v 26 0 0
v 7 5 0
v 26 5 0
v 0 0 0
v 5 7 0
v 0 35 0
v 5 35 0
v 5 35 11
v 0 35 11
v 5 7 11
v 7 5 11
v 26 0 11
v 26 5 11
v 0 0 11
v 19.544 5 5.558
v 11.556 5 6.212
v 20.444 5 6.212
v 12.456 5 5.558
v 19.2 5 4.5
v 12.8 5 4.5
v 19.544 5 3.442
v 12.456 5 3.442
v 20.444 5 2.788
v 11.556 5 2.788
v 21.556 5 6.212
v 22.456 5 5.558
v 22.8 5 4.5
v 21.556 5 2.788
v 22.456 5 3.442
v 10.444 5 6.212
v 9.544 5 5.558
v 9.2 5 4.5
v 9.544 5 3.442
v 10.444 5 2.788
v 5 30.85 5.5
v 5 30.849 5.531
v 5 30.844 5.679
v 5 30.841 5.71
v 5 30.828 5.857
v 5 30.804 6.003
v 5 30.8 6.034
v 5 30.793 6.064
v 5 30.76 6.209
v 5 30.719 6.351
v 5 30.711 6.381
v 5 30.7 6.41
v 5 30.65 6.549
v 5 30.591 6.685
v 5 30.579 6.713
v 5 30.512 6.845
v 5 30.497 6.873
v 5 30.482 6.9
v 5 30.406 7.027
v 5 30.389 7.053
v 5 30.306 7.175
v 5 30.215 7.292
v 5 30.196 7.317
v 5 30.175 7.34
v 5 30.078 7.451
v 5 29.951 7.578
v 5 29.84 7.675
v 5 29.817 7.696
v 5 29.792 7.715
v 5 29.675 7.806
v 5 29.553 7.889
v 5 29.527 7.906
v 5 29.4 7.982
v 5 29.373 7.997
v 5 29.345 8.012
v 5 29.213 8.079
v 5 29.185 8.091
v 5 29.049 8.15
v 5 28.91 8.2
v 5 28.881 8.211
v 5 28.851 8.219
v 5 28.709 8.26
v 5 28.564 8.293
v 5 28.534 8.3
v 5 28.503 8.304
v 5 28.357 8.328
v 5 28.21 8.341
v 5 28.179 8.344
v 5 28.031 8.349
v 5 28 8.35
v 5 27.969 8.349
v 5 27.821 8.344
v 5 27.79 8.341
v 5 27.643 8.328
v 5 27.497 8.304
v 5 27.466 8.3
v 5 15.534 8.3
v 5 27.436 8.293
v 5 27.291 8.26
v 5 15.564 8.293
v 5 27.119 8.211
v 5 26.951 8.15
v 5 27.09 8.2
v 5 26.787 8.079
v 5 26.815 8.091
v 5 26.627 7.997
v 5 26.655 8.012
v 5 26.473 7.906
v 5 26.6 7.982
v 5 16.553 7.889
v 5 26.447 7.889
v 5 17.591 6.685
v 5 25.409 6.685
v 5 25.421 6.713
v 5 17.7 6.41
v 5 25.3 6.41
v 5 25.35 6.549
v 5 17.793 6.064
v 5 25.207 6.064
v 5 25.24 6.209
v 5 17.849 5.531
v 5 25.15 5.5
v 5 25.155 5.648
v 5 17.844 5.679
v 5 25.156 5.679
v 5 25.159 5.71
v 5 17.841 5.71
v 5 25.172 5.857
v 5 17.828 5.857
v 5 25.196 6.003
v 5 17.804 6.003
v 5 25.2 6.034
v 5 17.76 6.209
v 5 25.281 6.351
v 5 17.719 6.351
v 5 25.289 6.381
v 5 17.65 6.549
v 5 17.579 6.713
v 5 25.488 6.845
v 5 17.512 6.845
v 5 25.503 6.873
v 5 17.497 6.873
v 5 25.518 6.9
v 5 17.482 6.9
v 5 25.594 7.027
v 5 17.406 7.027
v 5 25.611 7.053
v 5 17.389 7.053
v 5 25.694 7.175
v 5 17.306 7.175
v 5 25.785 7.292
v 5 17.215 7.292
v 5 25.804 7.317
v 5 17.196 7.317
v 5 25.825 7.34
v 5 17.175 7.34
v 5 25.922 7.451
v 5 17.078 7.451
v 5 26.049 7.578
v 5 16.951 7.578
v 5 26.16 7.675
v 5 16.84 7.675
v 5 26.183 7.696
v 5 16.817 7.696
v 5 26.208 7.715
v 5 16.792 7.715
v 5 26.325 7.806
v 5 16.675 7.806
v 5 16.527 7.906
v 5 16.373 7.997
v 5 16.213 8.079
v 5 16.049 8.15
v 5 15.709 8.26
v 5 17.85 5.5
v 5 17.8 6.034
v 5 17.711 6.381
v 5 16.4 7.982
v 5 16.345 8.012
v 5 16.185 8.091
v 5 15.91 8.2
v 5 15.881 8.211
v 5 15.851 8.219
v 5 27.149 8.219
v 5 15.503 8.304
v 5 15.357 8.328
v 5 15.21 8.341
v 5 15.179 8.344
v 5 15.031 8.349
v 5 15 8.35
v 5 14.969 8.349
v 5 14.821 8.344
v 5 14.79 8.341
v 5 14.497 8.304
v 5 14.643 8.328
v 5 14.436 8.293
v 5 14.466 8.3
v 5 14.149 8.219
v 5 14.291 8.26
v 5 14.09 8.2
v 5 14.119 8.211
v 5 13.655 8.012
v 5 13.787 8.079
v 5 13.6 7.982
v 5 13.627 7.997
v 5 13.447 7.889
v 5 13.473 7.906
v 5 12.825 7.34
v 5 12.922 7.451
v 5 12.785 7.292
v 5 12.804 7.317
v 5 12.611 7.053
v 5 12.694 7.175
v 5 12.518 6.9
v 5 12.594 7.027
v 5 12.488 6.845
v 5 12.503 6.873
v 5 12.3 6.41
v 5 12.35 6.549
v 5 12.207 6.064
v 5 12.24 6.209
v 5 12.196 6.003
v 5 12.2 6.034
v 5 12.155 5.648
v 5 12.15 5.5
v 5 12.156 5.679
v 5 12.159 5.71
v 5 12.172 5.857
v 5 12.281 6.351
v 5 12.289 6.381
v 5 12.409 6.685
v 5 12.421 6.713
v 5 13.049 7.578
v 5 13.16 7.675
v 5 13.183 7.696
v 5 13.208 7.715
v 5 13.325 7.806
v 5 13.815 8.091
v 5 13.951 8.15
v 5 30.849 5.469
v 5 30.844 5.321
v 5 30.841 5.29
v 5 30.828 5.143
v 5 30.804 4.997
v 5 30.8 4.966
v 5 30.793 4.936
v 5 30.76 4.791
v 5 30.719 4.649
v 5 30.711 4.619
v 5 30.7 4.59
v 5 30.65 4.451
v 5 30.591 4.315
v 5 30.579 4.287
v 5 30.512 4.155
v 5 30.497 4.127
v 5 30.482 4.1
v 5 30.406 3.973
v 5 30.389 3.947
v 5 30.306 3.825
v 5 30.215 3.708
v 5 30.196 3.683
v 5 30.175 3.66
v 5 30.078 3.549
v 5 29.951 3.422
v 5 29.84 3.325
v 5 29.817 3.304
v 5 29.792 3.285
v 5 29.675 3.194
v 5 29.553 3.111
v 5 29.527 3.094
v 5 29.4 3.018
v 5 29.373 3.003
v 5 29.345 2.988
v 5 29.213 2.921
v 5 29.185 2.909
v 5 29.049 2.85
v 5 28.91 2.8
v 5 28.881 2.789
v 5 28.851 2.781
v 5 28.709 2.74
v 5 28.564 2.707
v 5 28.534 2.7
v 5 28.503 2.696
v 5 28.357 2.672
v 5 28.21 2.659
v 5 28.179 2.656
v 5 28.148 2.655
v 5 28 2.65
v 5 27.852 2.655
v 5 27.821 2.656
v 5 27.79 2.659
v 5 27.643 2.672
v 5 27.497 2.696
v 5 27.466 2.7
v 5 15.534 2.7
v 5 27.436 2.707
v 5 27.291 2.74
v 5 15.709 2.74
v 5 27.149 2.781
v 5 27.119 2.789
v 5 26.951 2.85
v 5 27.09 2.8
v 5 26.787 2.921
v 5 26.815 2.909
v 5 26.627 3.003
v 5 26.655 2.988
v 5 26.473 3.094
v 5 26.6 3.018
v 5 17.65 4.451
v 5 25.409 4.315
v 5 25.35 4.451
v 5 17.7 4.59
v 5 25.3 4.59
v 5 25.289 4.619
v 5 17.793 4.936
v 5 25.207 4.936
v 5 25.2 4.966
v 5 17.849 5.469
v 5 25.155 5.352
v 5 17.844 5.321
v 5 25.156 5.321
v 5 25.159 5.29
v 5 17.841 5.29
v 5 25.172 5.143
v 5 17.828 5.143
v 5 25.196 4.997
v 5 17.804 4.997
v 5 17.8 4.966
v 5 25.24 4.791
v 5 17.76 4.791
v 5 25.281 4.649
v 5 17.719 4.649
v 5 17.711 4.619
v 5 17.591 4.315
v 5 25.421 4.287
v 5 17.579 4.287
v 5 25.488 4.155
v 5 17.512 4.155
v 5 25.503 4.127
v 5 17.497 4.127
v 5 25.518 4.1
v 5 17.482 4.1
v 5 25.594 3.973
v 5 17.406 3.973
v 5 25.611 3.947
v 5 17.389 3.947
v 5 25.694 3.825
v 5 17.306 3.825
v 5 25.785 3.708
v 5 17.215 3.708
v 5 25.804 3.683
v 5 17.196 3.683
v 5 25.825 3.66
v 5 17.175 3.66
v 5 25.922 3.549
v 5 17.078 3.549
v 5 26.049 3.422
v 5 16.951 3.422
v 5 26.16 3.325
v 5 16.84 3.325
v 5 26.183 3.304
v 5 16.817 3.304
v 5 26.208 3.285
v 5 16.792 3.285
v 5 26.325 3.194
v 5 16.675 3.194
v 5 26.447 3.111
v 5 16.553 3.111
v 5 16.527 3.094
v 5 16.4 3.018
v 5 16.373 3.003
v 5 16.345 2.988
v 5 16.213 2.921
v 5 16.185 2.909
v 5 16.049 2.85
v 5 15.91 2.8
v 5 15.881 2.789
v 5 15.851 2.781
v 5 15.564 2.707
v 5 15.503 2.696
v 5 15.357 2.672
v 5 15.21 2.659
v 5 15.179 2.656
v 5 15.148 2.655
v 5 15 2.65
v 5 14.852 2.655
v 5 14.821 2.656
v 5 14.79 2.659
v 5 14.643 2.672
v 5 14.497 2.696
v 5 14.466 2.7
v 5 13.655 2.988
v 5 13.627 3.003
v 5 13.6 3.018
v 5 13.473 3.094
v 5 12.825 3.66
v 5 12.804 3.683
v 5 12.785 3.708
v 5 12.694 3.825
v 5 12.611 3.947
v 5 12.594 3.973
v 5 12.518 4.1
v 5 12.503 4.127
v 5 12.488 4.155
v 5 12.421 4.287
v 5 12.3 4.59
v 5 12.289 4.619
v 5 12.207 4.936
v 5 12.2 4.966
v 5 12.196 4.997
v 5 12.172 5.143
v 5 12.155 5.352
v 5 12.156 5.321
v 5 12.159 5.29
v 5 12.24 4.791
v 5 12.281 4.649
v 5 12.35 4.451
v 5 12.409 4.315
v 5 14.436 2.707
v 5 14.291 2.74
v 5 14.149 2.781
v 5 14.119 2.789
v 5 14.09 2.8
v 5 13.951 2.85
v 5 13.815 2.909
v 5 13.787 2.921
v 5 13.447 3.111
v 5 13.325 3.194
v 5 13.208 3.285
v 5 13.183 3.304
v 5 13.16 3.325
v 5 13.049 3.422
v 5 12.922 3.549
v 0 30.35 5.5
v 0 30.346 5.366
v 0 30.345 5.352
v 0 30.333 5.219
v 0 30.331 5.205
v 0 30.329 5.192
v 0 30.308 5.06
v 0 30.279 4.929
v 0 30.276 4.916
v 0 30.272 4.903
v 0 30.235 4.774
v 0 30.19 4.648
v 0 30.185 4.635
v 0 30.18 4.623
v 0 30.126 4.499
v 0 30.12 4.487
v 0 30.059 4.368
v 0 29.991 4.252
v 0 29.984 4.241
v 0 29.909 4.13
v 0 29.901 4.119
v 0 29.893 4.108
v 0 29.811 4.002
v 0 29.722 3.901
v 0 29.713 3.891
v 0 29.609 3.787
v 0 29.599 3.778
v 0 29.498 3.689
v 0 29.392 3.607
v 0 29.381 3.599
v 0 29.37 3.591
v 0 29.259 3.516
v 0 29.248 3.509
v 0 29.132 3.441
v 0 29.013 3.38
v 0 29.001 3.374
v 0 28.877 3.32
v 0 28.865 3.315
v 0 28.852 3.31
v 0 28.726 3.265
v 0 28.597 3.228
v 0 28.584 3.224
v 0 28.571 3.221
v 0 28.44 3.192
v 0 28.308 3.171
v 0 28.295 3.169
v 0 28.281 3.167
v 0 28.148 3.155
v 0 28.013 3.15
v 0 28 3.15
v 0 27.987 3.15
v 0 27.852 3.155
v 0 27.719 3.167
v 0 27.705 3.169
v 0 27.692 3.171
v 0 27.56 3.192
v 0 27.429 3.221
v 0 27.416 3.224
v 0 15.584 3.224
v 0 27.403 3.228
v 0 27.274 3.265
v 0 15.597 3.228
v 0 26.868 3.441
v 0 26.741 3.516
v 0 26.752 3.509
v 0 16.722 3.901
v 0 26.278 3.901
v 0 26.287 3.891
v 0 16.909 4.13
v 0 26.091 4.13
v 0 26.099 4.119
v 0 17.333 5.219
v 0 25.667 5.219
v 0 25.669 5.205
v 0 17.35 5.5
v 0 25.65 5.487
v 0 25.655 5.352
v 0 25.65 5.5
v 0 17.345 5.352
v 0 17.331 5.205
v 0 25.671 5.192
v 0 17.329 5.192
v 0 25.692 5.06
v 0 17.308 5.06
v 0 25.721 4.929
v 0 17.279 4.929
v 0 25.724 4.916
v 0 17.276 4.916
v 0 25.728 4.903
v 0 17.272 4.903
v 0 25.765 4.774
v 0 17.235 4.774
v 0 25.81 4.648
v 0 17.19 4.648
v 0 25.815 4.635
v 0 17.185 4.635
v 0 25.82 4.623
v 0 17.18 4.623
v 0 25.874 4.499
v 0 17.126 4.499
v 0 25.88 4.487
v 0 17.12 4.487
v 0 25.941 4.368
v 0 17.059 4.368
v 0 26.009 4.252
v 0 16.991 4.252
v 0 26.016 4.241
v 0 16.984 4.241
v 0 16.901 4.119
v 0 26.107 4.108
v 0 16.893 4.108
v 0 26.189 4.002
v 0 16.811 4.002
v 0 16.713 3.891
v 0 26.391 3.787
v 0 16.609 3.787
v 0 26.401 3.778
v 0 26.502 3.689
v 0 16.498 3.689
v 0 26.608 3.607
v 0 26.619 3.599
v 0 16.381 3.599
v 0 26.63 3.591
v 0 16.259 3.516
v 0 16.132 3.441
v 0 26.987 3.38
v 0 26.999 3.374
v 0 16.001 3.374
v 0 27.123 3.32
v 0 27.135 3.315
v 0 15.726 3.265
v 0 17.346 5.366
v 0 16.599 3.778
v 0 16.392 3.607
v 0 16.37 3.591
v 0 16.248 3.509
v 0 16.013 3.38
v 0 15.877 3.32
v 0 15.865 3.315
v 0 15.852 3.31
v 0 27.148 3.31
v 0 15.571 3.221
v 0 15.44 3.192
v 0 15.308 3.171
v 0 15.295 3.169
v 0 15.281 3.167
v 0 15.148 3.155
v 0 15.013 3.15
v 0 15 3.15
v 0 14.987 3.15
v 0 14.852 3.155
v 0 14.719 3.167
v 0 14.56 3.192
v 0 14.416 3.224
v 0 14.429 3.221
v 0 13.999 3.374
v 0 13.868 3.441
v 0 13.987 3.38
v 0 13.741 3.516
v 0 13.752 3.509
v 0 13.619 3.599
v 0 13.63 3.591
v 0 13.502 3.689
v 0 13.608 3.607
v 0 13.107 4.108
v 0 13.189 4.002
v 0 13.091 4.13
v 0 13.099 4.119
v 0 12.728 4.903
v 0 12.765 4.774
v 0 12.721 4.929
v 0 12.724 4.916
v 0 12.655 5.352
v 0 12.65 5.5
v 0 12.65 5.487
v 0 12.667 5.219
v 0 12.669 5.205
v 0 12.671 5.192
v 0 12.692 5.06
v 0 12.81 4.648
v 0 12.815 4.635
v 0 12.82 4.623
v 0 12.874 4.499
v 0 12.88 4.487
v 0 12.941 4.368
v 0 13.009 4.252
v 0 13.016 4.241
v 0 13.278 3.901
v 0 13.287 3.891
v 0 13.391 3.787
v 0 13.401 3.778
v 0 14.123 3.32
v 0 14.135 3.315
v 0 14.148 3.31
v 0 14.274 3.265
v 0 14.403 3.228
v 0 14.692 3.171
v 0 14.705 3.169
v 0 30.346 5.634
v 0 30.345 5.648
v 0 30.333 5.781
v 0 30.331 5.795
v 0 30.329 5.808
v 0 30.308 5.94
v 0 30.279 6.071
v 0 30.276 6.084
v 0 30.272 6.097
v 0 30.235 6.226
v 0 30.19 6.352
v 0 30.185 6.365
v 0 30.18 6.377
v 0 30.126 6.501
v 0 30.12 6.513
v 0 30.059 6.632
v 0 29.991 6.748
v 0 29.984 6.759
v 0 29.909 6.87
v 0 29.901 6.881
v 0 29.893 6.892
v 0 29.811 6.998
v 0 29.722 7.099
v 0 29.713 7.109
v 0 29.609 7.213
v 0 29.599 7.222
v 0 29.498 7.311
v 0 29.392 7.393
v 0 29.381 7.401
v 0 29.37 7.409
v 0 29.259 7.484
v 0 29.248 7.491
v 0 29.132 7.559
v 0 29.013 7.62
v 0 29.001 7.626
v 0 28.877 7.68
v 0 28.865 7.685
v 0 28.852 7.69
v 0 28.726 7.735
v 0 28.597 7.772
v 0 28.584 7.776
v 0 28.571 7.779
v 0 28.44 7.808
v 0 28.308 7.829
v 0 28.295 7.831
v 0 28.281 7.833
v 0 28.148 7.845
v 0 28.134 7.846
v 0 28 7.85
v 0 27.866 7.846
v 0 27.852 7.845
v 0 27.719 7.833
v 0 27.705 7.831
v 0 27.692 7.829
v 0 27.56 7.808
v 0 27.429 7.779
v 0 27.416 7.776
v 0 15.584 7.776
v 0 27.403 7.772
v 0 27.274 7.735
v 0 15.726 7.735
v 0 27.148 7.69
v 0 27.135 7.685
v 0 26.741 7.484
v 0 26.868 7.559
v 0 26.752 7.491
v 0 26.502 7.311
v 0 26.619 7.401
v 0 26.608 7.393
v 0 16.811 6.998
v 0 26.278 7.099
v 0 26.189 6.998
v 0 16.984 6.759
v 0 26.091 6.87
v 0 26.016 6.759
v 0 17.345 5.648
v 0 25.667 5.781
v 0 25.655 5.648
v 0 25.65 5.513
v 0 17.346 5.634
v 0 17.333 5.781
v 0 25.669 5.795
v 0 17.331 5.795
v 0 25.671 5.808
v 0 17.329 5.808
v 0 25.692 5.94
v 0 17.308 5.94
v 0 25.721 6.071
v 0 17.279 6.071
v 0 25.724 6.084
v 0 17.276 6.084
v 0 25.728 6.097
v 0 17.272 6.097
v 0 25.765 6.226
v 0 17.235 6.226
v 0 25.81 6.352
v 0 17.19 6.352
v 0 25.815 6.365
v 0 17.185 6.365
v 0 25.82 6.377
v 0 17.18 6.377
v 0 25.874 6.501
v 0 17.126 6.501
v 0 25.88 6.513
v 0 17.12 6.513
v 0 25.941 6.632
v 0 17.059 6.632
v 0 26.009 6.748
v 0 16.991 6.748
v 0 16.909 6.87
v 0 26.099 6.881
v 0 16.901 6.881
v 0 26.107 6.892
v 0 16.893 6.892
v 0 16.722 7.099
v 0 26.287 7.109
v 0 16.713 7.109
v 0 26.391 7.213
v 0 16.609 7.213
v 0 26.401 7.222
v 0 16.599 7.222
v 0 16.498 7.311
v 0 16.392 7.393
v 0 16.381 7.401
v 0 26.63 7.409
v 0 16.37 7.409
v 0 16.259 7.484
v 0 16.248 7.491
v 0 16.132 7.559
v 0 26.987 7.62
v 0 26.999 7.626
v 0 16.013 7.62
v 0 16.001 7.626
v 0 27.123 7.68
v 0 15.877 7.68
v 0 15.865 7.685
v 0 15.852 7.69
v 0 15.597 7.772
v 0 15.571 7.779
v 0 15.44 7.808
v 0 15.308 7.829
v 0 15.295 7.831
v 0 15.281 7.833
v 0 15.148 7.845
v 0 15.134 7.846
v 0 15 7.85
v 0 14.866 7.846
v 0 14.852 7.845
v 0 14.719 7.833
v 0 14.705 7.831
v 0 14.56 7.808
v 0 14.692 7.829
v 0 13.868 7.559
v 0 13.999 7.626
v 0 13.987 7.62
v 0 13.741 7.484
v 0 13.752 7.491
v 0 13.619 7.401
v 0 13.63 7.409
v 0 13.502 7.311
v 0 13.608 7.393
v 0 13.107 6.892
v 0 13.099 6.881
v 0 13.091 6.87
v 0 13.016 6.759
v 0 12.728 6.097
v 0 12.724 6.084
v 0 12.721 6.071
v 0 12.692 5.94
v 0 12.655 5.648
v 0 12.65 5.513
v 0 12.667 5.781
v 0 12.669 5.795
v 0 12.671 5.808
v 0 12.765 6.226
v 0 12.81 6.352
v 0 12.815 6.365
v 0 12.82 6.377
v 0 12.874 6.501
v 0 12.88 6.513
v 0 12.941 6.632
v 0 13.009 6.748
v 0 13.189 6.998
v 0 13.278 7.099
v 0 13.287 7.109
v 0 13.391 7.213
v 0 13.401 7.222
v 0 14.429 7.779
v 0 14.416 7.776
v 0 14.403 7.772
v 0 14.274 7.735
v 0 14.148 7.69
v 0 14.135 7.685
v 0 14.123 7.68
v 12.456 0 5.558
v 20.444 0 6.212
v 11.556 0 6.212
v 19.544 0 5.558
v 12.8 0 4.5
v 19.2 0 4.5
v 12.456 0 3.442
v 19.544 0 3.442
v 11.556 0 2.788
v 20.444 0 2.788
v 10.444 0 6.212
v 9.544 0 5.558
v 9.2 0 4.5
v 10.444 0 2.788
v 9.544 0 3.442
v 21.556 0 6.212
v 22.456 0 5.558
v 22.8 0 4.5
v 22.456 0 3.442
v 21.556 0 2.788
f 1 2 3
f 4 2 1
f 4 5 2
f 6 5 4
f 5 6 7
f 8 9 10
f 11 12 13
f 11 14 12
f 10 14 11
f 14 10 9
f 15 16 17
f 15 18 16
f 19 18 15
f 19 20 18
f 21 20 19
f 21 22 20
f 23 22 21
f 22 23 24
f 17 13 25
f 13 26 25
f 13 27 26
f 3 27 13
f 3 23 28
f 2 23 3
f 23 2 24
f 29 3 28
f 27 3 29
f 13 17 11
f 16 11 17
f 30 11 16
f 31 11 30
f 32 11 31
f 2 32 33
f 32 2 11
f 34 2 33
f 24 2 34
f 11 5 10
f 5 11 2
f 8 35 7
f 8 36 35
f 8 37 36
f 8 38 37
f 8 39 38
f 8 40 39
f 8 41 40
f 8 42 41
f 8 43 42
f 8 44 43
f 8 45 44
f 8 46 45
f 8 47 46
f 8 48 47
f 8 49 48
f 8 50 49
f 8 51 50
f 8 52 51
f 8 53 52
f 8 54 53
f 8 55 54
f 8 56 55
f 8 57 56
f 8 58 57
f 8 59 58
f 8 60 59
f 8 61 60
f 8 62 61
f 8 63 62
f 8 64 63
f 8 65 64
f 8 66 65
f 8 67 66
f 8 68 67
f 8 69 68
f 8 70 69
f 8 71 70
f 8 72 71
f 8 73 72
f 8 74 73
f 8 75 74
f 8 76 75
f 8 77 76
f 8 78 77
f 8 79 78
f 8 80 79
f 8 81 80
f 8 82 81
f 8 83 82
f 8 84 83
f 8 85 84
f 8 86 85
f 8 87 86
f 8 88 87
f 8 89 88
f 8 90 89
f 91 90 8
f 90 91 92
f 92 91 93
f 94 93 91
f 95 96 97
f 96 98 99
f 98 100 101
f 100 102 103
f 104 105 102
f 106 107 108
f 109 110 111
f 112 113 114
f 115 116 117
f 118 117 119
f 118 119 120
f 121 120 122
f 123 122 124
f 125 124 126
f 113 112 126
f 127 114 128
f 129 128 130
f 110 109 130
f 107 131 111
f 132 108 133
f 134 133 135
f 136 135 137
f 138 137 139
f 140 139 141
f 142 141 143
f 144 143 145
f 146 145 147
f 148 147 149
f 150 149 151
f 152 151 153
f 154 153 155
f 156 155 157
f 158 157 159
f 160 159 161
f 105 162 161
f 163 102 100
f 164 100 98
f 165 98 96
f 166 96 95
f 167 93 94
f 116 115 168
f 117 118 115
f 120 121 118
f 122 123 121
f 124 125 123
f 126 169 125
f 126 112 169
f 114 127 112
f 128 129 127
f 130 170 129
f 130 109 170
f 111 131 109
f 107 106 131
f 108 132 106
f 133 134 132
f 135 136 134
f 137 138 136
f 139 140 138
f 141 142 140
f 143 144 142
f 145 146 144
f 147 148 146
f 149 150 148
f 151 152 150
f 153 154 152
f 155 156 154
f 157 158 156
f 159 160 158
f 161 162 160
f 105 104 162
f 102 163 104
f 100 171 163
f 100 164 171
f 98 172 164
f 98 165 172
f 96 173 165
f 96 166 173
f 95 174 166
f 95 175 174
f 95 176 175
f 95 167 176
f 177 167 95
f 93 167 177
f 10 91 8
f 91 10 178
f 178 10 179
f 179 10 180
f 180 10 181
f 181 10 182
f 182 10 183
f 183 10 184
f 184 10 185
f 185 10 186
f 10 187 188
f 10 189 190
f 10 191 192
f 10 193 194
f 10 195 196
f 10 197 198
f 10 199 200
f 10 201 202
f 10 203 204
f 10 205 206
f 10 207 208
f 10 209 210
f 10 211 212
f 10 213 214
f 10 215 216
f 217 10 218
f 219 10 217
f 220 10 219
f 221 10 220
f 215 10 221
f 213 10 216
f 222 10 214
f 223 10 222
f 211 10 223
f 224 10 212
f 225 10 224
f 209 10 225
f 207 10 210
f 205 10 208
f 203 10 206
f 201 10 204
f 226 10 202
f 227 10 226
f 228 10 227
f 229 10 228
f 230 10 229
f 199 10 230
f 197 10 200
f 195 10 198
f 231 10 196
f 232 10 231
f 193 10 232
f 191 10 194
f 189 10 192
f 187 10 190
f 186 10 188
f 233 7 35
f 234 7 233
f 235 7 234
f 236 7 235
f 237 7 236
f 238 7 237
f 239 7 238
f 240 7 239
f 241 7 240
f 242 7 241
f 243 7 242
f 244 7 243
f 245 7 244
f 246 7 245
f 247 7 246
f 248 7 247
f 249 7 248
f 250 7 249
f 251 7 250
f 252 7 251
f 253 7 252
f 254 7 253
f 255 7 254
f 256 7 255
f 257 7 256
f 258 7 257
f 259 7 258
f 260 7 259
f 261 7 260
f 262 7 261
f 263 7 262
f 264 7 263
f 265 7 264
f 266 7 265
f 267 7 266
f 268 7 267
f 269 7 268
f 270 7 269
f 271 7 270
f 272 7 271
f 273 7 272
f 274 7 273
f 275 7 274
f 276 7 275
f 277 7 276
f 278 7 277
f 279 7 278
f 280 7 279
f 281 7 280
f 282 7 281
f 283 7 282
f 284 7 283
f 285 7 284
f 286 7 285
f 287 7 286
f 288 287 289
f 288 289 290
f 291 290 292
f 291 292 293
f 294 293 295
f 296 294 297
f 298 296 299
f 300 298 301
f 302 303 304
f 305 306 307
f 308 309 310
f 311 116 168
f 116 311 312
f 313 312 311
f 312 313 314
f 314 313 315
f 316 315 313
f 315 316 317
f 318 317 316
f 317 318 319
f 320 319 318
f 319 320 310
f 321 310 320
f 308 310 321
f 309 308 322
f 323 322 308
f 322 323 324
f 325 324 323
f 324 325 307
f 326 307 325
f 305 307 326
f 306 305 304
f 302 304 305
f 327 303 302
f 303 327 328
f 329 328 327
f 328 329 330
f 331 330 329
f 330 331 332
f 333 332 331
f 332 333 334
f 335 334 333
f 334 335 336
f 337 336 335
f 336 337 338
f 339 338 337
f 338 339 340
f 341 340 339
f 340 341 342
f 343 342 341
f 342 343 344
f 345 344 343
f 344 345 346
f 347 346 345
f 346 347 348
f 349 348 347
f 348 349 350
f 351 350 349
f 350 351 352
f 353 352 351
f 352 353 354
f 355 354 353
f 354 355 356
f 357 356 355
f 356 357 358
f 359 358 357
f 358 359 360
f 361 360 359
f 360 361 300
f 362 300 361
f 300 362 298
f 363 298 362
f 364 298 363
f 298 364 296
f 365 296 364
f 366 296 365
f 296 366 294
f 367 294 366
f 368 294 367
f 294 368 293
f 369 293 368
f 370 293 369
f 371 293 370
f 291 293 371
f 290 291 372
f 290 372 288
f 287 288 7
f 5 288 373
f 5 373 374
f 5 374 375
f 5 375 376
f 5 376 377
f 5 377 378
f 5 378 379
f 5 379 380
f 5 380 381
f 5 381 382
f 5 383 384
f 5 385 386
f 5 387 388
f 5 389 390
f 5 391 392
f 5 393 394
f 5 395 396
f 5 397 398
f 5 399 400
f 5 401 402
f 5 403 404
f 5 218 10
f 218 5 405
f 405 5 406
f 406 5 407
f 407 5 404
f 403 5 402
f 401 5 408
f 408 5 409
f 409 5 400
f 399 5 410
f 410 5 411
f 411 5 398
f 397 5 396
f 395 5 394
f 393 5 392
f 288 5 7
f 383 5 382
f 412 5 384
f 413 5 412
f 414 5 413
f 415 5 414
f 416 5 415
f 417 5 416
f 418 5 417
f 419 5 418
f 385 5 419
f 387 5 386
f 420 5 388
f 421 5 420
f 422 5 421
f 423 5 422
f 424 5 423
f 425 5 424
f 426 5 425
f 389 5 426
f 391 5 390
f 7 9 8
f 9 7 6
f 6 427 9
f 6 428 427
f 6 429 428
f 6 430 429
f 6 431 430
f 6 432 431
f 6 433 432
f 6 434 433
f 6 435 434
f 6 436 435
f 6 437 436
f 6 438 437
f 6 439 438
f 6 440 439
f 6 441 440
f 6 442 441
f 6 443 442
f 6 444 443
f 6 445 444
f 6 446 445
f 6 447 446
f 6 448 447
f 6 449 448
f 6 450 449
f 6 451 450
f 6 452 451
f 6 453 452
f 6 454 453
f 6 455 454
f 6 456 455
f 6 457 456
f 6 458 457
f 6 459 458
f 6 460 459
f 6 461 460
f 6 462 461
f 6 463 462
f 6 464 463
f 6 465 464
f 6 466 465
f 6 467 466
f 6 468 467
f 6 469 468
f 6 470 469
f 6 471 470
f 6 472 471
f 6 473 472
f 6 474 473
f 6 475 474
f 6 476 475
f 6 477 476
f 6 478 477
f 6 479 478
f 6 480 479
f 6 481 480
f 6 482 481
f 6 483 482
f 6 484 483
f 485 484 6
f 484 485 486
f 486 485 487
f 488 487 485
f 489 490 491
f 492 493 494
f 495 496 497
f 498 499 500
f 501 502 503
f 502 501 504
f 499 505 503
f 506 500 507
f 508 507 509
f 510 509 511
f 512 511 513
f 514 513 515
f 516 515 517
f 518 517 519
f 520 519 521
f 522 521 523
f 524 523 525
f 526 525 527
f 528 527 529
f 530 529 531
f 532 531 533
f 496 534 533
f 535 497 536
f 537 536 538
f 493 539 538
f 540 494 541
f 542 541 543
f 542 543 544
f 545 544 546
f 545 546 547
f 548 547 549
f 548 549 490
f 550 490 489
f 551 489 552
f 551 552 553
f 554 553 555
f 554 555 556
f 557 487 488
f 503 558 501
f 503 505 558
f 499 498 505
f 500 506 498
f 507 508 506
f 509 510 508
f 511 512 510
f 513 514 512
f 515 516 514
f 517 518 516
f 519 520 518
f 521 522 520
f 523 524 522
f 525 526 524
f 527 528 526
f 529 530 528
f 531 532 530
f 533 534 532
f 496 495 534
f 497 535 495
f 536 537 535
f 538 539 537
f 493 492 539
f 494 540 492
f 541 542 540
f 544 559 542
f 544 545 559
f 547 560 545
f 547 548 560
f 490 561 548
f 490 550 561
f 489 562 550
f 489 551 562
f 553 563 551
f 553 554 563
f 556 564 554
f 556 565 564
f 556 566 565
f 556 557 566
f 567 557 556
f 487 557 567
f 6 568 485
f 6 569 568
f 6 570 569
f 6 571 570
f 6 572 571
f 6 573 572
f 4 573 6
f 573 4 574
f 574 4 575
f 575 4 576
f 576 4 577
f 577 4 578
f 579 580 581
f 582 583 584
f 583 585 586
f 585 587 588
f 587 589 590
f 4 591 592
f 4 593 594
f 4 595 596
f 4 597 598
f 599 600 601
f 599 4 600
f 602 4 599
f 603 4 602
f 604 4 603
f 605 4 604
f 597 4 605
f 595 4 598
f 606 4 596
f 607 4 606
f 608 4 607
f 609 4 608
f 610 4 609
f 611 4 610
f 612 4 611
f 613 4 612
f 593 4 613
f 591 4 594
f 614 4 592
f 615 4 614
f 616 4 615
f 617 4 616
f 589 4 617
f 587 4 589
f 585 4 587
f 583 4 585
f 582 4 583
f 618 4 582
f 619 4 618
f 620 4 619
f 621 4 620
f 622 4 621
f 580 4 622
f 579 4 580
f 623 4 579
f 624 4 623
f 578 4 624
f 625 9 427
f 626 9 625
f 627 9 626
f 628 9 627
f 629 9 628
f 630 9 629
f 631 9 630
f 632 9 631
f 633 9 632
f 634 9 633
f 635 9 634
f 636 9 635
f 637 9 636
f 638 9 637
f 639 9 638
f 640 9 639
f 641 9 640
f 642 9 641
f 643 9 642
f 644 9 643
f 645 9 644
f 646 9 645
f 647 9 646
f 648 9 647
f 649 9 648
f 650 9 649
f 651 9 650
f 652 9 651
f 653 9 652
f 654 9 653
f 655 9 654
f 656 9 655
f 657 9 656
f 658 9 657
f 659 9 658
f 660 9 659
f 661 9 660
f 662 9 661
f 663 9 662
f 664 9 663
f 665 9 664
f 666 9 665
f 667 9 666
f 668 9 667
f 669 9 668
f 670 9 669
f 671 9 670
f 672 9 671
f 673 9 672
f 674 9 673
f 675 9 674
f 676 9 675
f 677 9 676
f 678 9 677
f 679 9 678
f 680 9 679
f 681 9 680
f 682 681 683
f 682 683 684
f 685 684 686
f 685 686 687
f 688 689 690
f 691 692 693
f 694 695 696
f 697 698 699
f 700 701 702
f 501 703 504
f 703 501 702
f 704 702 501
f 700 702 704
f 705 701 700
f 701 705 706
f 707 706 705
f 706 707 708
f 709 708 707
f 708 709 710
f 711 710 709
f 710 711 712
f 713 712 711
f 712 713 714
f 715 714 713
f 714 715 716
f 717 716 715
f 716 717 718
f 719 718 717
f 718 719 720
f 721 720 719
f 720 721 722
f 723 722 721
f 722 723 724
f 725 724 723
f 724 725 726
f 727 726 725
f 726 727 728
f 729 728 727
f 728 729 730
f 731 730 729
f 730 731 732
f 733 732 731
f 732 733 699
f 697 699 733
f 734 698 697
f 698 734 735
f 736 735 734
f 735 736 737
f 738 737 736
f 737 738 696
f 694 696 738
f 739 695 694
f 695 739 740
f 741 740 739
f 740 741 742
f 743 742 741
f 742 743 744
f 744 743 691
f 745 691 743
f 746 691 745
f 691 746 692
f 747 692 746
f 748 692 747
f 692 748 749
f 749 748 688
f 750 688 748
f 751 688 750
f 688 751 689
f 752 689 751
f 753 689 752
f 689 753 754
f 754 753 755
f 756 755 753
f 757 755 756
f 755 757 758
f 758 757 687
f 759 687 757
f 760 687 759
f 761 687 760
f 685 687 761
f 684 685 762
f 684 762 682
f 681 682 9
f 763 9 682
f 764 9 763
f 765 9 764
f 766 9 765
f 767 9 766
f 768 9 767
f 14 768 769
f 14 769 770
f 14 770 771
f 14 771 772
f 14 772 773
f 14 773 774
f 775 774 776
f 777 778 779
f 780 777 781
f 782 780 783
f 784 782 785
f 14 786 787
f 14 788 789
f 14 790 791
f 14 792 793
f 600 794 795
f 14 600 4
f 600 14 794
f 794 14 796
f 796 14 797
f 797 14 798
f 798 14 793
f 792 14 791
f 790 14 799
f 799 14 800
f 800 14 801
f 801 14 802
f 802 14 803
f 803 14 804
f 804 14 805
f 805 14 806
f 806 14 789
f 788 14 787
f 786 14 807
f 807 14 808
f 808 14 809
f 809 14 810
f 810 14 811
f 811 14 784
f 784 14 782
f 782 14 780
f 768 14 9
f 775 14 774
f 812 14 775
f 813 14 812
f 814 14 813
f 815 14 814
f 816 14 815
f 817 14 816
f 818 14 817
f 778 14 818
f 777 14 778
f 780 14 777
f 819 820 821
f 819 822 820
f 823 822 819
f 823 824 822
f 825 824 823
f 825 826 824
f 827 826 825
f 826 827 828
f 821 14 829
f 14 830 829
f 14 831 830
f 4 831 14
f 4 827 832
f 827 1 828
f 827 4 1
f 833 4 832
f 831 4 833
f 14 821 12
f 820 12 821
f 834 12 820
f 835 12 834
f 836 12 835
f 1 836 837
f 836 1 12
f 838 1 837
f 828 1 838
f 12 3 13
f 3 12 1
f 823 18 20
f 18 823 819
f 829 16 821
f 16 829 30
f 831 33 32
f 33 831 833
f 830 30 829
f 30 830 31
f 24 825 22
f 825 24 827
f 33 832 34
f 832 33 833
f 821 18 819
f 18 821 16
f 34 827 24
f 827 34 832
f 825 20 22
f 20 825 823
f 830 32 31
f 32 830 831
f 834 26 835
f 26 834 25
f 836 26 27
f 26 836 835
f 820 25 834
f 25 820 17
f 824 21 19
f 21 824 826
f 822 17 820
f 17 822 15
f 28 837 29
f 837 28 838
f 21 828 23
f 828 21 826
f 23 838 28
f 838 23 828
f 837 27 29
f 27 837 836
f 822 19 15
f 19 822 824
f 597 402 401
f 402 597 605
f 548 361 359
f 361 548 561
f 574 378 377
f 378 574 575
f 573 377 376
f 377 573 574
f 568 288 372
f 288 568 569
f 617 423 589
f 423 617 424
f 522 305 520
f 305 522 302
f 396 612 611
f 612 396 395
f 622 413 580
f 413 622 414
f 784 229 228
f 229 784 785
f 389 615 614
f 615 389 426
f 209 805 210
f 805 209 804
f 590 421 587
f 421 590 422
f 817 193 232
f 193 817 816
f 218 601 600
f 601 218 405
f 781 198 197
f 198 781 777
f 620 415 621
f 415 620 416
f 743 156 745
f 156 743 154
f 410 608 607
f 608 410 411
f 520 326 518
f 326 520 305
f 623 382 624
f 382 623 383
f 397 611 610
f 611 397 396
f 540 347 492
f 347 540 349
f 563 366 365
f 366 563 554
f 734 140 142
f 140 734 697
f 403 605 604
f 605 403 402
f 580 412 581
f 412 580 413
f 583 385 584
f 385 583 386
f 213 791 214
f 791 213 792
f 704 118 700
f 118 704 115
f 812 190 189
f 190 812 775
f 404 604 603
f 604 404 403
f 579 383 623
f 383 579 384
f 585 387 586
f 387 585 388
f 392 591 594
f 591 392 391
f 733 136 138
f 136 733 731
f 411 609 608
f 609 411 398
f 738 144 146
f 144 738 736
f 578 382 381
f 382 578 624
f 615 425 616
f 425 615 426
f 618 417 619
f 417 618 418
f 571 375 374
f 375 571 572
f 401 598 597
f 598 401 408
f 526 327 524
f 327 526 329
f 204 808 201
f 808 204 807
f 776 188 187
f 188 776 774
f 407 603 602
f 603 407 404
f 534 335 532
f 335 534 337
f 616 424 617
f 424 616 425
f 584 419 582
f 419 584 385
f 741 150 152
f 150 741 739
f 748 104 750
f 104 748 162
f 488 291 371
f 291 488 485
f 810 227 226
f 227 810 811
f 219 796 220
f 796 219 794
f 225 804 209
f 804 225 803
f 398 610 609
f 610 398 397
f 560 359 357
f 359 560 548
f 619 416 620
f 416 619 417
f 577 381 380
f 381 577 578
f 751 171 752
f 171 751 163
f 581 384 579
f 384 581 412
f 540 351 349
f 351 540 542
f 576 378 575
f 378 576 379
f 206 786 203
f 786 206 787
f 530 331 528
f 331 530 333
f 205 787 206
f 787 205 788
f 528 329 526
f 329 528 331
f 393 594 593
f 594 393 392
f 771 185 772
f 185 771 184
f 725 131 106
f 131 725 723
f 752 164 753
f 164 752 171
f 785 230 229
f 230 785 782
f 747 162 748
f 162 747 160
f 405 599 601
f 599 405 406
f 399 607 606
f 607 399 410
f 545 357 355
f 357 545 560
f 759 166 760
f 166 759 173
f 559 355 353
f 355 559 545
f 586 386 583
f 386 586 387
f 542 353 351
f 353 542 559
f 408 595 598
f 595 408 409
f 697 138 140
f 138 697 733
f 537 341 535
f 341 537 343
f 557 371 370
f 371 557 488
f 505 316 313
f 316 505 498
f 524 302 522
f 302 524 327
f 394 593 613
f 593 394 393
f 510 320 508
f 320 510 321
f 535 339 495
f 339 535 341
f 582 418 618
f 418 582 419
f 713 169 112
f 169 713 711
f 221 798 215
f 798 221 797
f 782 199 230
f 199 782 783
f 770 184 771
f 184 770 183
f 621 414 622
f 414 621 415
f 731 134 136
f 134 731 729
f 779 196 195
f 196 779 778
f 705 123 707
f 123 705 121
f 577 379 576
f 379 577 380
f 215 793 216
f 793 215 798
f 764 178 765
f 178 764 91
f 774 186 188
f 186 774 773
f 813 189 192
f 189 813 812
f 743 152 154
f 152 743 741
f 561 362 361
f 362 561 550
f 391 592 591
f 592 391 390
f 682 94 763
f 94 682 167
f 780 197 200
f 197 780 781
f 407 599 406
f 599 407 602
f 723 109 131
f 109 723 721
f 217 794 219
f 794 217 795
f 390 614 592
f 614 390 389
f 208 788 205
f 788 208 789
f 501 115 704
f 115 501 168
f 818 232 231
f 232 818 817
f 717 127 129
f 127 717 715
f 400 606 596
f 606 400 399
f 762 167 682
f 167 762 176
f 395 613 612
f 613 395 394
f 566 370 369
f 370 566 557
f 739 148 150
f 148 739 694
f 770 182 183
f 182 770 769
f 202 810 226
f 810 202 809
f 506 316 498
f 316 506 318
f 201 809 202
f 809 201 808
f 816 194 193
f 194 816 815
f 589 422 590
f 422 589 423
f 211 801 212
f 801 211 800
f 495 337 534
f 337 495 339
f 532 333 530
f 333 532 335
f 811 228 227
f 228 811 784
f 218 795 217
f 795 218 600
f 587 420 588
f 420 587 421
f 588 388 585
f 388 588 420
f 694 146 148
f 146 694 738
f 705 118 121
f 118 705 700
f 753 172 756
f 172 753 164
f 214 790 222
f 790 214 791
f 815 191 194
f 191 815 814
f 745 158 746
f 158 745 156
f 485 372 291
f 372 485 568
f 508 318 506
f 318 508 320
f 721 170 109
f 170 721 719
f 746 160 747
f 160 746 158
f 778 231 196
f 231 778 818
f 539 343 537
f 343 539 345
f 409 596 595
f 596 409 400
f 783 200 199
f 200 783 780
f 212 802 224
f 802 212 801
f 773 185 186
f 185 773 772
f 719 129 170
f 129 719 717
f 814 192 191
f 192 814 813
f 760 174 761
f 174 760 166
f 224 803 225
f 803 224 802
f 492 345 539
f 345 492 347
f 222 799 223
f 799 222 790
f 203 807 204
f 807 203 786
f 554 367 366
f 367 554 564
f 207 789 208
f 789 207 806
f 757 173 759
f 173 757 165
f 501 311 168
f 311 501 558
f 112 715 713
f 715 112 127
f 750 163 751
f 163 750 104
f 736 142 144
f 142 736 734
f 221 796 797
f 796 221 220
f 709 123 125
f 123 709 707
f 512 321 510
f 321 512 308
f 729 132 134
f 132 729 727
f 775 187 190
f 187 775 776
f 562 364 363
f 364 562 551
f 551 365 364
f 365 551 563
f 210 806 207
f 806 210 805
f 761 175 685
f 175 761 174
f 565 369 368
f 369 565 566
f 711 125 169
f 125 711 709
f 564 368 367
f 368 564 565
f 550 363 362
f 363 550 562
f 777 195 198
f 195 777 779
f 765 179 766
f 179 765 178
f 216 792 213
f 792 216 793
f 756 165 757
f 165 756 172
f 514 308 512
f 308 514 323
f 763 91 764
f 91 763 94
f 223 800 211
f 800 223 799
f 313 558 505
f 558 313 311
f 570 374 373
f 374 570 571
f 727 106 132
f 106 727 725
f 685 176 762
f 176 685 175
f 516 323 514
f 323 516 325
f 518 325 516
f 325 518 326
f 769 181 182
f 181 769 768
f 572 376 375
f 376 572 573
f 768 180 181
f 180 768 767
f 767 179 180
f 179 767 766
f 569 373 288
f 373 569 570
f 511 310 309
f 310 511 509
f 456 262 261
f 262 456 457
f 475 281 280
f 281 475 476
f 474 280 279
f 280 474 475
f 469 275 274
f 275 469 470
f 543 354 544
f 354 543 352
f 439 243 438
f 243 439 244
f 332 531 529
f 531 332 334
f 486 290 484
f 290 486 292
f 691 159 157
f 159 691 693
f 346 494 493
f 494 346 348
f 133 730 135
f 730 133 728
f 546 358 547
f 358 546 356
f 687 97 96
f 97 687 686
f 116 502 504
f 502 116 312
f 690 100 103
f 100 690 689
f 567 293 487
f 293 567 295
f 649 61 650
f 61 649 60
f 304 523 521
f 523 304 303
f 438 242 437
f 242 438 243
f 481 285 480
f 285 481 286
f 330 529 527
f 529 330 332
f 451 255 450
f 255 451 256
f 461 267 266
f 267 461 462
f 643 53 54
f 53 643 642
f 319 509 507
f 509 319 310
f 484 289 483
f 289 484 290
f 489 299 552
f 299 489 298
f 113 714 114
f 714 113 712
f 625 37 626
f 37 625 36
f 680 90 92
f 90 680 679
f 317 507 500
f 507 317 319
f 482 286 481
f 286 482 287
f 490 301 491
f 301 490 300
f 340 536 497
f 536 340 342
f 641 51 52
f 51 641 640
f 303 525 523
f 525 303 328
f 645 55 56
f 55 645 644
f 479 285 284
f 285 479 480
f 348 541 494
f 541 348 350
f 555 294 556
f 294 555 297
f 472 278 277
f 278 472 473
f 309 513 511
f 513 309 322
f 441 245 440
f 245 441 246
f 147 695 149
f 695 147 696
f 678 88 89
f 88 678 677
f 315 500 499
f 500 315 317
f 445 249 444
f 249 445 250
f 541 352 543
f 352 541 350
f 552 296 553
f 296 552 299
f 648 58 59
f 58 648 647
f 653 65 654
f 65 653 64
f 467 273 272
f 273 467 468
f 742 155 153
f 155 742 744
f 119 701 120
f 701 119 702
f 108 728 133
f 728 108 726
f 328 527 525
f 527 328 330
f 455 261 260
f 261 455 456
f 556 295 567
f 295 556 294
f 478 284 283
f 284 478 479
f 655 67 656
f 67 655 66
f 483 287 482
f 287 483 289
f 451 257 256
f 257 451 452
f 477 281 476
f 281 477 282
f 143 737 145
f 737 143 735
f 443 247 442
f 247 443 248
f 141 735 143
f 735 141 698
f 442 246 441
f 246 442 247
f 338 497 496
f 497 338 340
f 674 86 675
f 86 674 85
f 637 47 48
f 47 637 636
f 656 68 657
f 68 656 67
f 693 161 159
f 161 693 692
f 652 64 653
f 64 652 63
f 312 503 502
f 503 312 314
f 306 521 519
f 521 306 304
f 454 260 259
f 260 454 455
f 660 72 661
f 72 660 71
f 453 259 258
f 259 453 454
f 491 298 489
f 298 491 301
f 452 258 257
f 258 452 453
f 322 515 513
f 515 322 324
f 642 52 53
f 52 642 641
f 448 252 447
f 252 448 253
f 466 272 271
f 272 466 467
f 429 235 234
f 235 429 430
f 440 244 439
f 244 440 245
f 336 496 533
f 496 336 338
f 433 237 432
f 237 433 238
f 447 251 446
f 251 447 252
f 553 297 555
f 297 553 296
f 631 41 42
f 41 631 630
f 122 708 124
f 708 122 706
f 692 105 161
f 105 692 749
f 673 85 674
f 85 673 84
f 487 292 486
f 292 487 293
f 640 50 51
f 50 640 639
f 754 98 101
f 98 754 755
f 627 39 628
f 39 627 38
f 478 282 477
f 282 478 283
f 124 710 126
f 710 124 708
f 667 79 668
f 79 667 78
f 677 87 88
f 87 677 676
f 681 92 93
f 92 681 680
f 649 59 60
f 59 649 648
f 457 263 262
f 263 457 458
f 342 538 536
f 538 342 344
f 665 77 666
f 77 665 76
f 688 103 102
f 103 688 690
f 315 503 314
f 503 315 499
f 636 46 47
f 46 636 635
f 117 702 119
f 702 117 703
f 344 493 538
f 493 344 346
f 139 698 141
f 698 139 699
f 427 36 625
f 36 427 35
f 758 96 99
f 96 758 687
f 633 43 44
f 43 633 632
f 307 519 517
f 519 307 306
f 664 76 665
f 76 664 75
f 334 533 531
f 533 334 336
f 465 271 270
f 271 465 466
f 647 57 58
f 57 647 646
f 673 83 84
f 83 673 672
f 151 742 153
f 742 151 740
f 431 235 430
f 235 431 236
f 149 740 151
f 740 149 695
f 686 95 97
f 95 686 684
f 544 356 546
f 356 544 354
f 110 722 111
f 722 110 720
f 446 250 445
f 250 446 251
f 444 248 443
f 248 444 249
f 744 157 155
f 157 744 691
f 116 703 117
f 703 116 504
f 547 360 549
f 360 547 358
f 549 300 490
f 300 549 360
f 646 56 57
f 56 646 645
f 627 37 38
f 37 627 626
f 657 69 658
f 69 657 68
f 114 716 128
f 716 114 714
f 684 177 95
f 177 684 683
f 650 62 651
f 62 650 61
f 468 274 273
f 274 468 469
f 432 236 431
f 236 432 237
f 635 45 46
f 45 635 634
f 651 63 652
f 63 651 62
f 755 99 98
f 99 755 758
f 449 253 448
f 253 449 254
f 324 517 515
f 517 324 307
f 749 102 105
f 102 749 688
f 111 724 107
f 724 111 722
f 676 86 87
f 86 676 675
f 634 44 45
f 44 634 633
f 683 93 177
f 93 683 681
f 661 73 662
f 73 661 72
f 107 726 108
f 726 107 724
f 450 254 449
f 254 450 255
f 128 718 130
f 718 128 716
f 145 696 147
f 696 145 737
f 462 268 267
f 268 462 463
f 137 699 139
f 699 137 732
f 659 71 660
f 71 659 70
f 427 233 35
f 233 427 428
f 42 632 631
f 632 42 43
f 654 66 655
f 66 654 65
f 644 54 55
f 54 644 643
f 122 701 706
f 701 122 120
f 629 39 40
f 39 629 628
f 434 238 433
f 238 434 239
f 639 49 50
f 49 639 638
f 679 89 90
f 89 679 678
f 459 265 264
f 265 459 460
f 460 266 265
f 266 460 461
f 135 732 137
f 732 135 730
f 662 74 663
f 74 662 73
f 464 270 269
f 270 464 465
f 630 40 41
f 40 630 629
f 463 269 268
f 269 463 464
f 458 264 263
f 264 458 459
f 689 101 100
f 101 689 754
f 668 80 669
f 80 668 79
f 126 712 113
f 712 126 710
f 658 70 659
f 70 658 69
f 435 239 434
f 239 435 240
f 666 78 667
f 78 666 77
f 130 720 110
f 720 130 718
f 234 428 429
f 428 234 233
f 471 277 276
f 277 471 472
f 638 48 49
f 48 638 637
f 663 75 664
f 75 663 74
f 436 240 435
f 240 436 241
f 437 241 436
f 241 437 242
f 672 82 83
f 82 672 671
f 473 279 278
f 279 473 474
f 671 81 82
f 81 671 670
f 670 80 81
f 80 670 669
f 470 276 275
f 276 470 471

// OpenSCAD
m3_diameter = 3.6;

difference(){
	union(){
        linear_extrude (11)
            polygon ([
                [0, 0],
                [26, 0],
                [26, 5],
                [7, 5],
                [5, 7],
                [5, 35],
                [0, 35]
            ]);
	}
	translate([11, 6, 4.5]) rotate([90, 0, 0]) cylinder(h =20, r = m3_diameter/2, $fn = 10);
	translate([21, 6, 4.5]) rotate([90, 0, 0]) cylinder(h =20, r = m3_diameter/2, $fn = 10);
	translate([-0.5, 15, 5.5]) rotate([0, 90, 0]) cylinder(h =7, r1 = 2.3, r2=3, $fn = 100);
	translate([-0.5, 28, 5.5]) rotate([0, 90, 0]) cylinder(h =7, r1 = 2.3, r2=3, $fn = 100);
}
